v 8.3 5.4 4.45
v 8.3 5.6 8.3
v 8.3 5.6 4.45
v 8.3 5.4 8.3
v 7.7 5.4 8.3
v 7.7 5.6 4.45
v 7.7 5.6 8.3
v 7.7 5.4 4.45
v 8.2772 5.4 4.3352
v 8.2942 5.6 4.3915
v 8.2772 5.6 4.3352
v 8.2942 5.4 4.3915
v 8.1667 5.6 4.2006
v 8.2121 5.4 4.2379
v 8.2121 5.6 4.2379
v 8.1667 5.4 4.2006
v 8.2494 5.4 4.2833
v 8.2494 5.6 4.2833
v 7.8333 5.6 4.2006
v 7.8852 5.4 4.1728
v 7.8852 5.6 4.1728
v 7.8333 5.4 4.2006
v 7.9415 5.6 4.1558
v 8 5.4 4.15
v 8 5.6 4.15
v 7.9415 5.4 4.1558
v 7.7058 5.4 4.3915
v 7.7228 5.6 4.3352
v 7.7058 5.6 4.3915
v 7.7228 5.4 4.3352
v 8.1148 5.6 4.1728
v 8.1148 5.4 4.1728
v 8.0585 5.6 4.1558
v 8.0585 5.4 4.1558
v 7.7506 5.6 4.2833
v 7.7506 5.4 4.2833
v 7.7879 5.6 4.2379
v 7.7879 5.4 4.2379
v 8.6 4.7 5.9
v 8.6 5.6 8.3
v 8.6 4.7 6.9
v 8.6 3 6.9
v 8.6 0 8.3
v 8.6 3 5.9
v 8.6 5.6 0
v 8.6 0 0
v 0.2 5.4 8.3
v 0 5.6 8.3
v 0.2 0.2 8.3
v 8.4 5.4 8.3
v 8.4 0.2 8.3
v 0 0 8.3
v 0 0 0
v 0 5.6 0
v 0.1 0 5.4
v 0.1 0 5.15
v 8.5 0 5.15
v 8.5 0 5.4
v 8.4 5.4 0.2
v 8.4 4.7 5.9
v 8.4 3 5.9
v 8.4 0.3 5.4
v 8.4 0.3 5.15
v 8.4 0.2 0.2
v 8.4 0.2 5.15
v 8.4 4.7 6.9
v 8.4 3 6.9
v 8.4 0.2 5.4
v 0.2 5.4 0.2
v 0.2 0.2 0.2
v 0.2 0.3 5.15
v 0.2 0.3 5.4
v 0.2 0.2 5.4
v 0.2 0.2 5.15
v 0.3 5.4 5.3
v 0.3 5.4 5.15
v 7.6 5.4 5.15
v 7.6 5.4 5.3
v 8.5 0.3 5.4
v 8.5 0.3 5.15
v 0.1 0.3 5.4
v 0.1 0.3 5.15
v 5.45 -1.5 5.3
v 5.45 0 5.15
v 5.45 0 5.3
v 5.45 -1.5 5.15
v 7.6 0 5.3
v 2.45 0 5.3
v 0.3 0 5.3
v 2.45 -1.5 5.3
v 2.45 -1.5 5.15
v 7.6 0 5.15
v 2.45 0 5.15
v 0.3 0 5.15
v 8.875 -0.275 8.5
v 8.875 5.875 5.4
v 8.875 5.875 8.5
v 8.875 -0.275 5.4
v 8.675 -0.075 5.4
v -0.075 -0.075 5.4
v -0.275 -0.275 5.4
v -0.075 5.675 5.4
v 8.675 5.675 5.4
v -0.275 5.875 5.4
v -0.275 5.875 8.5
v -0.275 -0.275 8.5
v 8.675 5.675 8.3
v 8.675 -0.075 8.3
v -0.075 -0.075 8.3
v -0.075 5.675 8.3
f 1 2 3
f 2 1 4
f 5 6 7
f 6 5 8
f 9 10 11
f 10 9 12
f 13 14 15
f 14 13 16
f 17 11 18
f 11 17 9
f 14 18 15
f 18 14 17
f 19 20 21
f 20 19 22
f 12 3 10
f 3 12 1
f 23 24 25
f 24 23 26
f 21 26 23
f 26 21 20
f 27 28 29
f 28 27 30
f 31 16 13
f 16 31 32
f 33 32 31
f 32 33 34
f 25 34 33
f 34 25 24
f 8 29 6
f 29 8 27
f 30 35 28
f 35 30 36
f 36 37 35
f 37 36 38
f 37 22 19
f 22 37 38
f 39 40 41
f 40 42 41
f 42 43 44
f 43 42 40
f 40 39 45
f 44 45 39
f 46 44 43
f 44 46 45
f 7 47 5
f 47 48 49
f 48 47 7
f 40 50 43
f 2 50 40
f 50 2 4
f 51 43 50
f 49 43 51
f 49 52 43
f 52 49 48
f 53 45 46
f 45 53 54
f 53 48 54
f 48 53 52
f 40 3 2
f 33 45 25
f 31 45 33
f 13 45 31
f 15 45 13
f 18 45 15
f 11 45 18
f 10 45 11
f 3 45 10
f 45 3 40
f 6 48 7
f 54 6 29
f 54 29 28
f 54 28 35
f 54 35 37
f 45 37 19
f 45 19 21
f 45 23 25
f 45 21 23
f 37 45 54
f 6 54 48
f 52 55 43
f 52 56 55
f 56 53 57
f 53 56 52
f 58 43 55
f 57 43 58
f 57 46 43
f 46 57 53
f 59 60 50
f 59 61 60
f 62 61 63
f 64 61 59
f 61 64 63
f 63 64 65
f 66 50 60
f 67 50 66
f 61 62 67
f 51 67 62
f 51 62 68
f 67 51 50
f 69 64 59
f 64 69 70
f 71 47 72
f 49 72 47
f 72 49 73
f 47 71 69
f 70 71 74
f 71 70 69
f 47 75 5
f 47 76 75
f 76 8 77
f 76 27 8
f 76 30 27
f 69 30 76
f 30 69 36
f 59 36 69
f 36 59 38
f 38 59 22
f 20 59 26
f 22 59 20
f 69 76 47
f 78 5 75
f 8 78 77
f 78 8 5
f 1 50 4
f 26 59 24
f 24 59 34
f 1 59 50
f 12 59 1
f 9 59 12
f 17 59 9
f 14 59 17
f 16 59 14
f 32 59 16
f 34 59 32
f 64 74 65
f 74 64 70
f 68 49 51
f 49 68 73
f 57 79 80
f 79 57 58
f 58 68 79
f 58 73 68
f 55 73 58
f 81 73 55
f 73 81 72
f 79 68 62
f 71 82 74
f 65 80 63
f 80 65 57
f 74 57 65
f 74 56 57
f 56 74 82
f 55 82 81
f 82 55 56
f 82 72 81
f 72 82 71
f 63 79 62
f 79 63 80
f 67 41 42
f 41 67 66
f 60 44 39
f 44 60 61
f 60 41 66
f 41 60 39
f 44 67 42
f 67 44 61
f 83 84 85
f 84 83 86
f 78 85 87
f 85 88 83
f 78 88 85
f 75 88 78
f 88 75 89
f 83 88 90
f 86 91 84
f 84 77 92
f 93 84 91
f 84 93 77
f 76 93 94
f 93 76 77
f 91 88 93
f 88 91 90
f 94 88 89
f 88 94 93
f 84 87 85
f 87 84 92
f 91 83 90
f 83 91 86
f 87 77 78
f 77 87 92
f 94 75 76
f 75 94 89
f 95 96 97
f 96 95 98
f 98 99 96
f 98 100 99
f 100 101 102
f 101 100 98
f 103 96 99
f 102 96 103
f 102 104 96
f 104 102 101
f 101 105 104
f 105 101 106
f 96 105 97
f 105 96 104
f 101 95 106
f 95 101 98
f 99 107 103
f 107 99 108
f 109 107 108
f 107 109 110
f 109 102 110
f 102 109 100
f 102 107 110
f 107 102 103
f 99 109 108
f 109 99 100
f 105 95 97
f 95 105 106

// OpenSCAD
/* ======================================================================
   MOBILE CHARGER CASE — v2 (IIT Hyderabad, EE ICDT)
   ----------------------------------------------------------------------
   Layout (X = length ~8cm, Y = width ~5cm, Z = height):
     - Transformer chamber: fixed, at the bottom.
     - Sliding TRAY: same footprint as the perfboard (7.3 x 5 x 0.15),
       sits on top of the transformer chamber, slides OUT through the
       front long wall (Y = 0) — pull the tab, the whole tray comes out.
     - Perfboard chamber: open top, sits above the tray.
     - Because the perfboard (7.3) is shorter than the transformer (8),
       the tray leaves a ~0.8cm gap along one side of the box — this is
       reused as the routing gap for the 2 thin secondary wires running
       from the transformer up to the perfboard. No extra hole needed.
     - A separate keyhole+channel on the BACK wall carries the thick
       incoming AC mains wire down from the top of the box to the
       transformer.
     - Lid: friction-fit skirt over the whole perfboard-chamber's
       outside walls, with its own USB / wire-channel cutouts so both
       stay usable with the lid on.

   Units: cm. ASSUMPTIONS ARE FLAGGED — check the echo() output and the
   comments marked "ASSUMPTION".
   ====================================================================== */

// ---------- WHICH PART TO SHOW / EXPORT ----------
PART = "assembly";   // "assembly" | "box" | "tray" | "lid"

// ================= GIVEN MEASUREMENTS =================
transformer_l = 8;     transformer_w = 5;     transformer_h = 4.8;
perfboard_l   = 7.3;   perfboard_w   = 5;     perfboard_h   = 0.4;

usb_w = 1.7;   usb_h = 1.0;   // ASSUMPTION: you wrote "1.7*10.8" — treated the
                              // trailing ".8" as a typo and kept 1.7 x 1 (matches
                              // every earlier message). Tell me the real number
                              // if this is wrong — it's one variable to fix.

clear_above_pcb = 2.5;        // air gap above the perfboard's top surface

tray_t = 0.15;                // 1.5mm, as you specified

// ================= BUFFERS =================
wall          = 0.2;   // 2mm walls — strong enough to carry the transformer
fit_buffer    = 0.2;   // static footprint clearance (2mm, "don't overdo it")
near_gap      = 0.1;   // small sliding clearance kept on the tray's flush side
vert_clear    = 0.1;   // total Z clearance for the tray inside its slot
lid_clearance = 0.15;  // total clearance for the lid's friction-fit skirt
hole_margin   = 0.15;  // extra margin on the LID's own USB/wire cutouts, so
                        // print tolerance never blocks them

// ================= DERIVED =================
// interior sized to the BIGGER footprint (the transformer, 8 x 5)
inner_L = max(transformer_l, perfboard_l) + fit_buffer;   // 8.2
inner_W = max(transformer_w, perfboard_w) + fit_buffer;   // 5.2
outer_L = inner_L + 2*wall;                               // 8.6
outer_W = inner_W + 2*wall;                               // 5.6

trans_h   = transformer_h + fit_buffer;                   // 5.0
trans_top = wall + trans_h;                               // 5.2

slot_h      = tray_t + vert_clear;                        // 0.25
slot_bottom = trans_top - vert_clear/2;                   // 5.15
slot_top    = slot_bottom + slot_h;                       // 5.40
perf_bottom = slot_top;                                    // floor of perfboard chamber

perf_chamber_h = perfboard_h + clear_above_pcb;           // 2.9
outer_H        = perf_bottom + perf_chamber_h;            // 8.30

// ---- tray (slides along Y, out through the Y=0 wall) ----
gap_total_x = inner_L - perfboard_l;                      // 0.9 leftover next to transformer
tray_x0 = wall + near_gap;                                // 0.3
tray_x1 = tray_x0 + perfboard_l;                          // 7.6  (far_gap = 0.8 beyond this)
blade_y = inner_W + wall;                                 // 5.4  reaches flush with outer front face
handle_w = 3.0;   handle_l = 1.5;                         // grip tab, centered in X

// ---- USB opening (short wall at X = outer_L) ----
usb_y0 = 3.0;                       // ASSUMPTION: "3cm from the longer (Y-normal) wall"
usb_z0 = perf_bottom + 0.5;         // ASSUMPTION: "0.5cm" read as height above the tray surface
                                    // -> re-check against your photo before printing (you flagged
                                    //    this hole's position as the one to double-check)

// ---- input-wire channel (back wall, Y = outer_W, inside the 0.8cm gap column) ----
wire_w        = 0.6;
wire_x0       = tray_x1 + (gap_total_x - near_gap - wire_w)/2;  // centered in the gap column
slit_z_top    = slot_bottom - 0.5;      // "the slit, 0.5cm below the sliding part"
keyhole_rect_h= 0.2;
keyhole_bottom= slit_z_top - keyhole_rect_h - wire_w/2;  // rectangle(0.2) + semicircle radius(0.3) = 0.5 total

echo("outer box L,W,H =", outer_L, outer_W, outer_H);
echo("USB opening Y,Z start =", usb_y0, usb_z0, " size", usb_w, "x", usb_h);
echo("wire gap column: X", tray_x1, "to", wall+inner_L, " width", inner_L - perfboard_l - near_gap);

// ======================================================================
//  SHARED CUTTERS
// ======================================================================
module usb_cut(margin=0) {
    translate([outer_L - wall - 0.1, usb_y0 - margin/2, usb_z0 - margin/2])
        cube([wall + 0.2, usb_w + margin, usb_h + margin]);
}

module tray_slot_cut() {
    translate([wall - 0.1, -0.1, slot_bottom])
        cube([inner_L + 0.2, wall + 0.2, slot_h]);
}

// the whole input-wire feature: straight channel from the top down to the
// slit, then a rectangle+semicircle "keyhole" for the last 0.5cm
module wire_channel_cut(margin=0) {
    y0 = inner_W + wall - 0.1;      // through the back (Y = outer_W) wall
    y1 = outer_W + 0.1;
    // upper straight channel
    translate([wire_x0 - margin/2, y0, slit_z_top])
        cube([wire_w + margin, y1 - y0, outer_H - slit_z_top + 0.2]);
    // keyhole rectangle part
    translate([wire_x0 - margin/2, y0, slit_z_top - keyhole_rect_h])
        cube([wire_w + margin, y1 - y0, keyhole_rect_h]);
    // keyhole rounded bottom
    translate([wire_x0 + wire_w/2, (y0+y1)/2, slit_z_top - keyhole_rect_h])
        rotate([90,0,0])
            cylinder(h = y1 - y0, r = wire_w/2 + margin/2, center = true, $fn = 32);
}

// ======================================================================
//  MAIN BOX
// ======================================================================
module main_box() {
    difference() {
        cube([outer_L, outer_W, outer_H]);
        translate([wall, wall, wall])
            cube([inner_L, inner_W, outer_H - wall + 1]);   // hollow, open top
        tray_slot_cut();
        usb_cut();
        wire_channel_cut();
    }
}

// ======================================================================
//  SLIDING TRAY
// ======================================================================
// Local Y convention: Y=0 is the OUTER tip of the handle (outside the case);
// Y increases going INTO the box. Blade spans [handle_l, handle_l+blade_y].
module tray() {
    union() {
        translate([perfboard_l/2 - handle_w/2, 0, 0])
            cube([handle_w, handle_l, tray_t]);                // grip tab, outside the case
        translate([0, handle_l, 0])
            cube([perfboard_l, blade_y, tray_t]);               // blade: matches perfboard footprint
    }
}

// ======================================================================
//  LID
// ======================================================================
module lid() {
    skirt_depth  = outer_H - perf_bottom;
    skirt_wall   = 0.2;
    lid_top_t    = 0.2;
    so_L = outer_L + lid_clearance + 2*skirt_wall;
    so_W = outer_W + lid_clearance + 2*skirt_wall;
    si_L = outer_L + lid_clearance;
    si_W = outer_W + lid_clearance;

    union() {
        translate([-skirt_wall - lid_clearance/2, -skirt_wall - lid_clearance/2, 0])
            cube([so_L, so_W, lid_top_t]);

        translate([0, 0, -skirt_depth])
            difference() {
                translate([-skirt_wall - lid_clearance/2, -skirt_wall - lid_clearance/2, 0])
                    cube([so_L, so_W, skirt_depth + lid_top_t]);
                translate([-lid_clearance/2, -lid_clearance/2, -0.1])
                    cube([si_L, si_W, skirt_depth + 0.1]);
                translate([0,0,skirt_depth]) usb_cut(hole_margin);
                translate([0,0,skirt_depth]) wire_channel_cut(hole_margin);
            }
    }
}

// ======================================================================
//  RENDER
// ======================================================================
if (PART == "assembly") {
    color("SteelBlue")      main_box();
    color("Orange")         translate([tray_x0, -handle_l, slot_bottom]) tray();
    color("LightGray", 0.5) translate([0, 0, outer_H]) lid();
} else if (PART == "box") {
    main_box();
} else if (PART == "tray") {
    tray();
} else if (PART == "lid") {
    translate([0, 0, outer_H - perf_bottom]) lid();   // sits flat, right-side up, for printing
}
